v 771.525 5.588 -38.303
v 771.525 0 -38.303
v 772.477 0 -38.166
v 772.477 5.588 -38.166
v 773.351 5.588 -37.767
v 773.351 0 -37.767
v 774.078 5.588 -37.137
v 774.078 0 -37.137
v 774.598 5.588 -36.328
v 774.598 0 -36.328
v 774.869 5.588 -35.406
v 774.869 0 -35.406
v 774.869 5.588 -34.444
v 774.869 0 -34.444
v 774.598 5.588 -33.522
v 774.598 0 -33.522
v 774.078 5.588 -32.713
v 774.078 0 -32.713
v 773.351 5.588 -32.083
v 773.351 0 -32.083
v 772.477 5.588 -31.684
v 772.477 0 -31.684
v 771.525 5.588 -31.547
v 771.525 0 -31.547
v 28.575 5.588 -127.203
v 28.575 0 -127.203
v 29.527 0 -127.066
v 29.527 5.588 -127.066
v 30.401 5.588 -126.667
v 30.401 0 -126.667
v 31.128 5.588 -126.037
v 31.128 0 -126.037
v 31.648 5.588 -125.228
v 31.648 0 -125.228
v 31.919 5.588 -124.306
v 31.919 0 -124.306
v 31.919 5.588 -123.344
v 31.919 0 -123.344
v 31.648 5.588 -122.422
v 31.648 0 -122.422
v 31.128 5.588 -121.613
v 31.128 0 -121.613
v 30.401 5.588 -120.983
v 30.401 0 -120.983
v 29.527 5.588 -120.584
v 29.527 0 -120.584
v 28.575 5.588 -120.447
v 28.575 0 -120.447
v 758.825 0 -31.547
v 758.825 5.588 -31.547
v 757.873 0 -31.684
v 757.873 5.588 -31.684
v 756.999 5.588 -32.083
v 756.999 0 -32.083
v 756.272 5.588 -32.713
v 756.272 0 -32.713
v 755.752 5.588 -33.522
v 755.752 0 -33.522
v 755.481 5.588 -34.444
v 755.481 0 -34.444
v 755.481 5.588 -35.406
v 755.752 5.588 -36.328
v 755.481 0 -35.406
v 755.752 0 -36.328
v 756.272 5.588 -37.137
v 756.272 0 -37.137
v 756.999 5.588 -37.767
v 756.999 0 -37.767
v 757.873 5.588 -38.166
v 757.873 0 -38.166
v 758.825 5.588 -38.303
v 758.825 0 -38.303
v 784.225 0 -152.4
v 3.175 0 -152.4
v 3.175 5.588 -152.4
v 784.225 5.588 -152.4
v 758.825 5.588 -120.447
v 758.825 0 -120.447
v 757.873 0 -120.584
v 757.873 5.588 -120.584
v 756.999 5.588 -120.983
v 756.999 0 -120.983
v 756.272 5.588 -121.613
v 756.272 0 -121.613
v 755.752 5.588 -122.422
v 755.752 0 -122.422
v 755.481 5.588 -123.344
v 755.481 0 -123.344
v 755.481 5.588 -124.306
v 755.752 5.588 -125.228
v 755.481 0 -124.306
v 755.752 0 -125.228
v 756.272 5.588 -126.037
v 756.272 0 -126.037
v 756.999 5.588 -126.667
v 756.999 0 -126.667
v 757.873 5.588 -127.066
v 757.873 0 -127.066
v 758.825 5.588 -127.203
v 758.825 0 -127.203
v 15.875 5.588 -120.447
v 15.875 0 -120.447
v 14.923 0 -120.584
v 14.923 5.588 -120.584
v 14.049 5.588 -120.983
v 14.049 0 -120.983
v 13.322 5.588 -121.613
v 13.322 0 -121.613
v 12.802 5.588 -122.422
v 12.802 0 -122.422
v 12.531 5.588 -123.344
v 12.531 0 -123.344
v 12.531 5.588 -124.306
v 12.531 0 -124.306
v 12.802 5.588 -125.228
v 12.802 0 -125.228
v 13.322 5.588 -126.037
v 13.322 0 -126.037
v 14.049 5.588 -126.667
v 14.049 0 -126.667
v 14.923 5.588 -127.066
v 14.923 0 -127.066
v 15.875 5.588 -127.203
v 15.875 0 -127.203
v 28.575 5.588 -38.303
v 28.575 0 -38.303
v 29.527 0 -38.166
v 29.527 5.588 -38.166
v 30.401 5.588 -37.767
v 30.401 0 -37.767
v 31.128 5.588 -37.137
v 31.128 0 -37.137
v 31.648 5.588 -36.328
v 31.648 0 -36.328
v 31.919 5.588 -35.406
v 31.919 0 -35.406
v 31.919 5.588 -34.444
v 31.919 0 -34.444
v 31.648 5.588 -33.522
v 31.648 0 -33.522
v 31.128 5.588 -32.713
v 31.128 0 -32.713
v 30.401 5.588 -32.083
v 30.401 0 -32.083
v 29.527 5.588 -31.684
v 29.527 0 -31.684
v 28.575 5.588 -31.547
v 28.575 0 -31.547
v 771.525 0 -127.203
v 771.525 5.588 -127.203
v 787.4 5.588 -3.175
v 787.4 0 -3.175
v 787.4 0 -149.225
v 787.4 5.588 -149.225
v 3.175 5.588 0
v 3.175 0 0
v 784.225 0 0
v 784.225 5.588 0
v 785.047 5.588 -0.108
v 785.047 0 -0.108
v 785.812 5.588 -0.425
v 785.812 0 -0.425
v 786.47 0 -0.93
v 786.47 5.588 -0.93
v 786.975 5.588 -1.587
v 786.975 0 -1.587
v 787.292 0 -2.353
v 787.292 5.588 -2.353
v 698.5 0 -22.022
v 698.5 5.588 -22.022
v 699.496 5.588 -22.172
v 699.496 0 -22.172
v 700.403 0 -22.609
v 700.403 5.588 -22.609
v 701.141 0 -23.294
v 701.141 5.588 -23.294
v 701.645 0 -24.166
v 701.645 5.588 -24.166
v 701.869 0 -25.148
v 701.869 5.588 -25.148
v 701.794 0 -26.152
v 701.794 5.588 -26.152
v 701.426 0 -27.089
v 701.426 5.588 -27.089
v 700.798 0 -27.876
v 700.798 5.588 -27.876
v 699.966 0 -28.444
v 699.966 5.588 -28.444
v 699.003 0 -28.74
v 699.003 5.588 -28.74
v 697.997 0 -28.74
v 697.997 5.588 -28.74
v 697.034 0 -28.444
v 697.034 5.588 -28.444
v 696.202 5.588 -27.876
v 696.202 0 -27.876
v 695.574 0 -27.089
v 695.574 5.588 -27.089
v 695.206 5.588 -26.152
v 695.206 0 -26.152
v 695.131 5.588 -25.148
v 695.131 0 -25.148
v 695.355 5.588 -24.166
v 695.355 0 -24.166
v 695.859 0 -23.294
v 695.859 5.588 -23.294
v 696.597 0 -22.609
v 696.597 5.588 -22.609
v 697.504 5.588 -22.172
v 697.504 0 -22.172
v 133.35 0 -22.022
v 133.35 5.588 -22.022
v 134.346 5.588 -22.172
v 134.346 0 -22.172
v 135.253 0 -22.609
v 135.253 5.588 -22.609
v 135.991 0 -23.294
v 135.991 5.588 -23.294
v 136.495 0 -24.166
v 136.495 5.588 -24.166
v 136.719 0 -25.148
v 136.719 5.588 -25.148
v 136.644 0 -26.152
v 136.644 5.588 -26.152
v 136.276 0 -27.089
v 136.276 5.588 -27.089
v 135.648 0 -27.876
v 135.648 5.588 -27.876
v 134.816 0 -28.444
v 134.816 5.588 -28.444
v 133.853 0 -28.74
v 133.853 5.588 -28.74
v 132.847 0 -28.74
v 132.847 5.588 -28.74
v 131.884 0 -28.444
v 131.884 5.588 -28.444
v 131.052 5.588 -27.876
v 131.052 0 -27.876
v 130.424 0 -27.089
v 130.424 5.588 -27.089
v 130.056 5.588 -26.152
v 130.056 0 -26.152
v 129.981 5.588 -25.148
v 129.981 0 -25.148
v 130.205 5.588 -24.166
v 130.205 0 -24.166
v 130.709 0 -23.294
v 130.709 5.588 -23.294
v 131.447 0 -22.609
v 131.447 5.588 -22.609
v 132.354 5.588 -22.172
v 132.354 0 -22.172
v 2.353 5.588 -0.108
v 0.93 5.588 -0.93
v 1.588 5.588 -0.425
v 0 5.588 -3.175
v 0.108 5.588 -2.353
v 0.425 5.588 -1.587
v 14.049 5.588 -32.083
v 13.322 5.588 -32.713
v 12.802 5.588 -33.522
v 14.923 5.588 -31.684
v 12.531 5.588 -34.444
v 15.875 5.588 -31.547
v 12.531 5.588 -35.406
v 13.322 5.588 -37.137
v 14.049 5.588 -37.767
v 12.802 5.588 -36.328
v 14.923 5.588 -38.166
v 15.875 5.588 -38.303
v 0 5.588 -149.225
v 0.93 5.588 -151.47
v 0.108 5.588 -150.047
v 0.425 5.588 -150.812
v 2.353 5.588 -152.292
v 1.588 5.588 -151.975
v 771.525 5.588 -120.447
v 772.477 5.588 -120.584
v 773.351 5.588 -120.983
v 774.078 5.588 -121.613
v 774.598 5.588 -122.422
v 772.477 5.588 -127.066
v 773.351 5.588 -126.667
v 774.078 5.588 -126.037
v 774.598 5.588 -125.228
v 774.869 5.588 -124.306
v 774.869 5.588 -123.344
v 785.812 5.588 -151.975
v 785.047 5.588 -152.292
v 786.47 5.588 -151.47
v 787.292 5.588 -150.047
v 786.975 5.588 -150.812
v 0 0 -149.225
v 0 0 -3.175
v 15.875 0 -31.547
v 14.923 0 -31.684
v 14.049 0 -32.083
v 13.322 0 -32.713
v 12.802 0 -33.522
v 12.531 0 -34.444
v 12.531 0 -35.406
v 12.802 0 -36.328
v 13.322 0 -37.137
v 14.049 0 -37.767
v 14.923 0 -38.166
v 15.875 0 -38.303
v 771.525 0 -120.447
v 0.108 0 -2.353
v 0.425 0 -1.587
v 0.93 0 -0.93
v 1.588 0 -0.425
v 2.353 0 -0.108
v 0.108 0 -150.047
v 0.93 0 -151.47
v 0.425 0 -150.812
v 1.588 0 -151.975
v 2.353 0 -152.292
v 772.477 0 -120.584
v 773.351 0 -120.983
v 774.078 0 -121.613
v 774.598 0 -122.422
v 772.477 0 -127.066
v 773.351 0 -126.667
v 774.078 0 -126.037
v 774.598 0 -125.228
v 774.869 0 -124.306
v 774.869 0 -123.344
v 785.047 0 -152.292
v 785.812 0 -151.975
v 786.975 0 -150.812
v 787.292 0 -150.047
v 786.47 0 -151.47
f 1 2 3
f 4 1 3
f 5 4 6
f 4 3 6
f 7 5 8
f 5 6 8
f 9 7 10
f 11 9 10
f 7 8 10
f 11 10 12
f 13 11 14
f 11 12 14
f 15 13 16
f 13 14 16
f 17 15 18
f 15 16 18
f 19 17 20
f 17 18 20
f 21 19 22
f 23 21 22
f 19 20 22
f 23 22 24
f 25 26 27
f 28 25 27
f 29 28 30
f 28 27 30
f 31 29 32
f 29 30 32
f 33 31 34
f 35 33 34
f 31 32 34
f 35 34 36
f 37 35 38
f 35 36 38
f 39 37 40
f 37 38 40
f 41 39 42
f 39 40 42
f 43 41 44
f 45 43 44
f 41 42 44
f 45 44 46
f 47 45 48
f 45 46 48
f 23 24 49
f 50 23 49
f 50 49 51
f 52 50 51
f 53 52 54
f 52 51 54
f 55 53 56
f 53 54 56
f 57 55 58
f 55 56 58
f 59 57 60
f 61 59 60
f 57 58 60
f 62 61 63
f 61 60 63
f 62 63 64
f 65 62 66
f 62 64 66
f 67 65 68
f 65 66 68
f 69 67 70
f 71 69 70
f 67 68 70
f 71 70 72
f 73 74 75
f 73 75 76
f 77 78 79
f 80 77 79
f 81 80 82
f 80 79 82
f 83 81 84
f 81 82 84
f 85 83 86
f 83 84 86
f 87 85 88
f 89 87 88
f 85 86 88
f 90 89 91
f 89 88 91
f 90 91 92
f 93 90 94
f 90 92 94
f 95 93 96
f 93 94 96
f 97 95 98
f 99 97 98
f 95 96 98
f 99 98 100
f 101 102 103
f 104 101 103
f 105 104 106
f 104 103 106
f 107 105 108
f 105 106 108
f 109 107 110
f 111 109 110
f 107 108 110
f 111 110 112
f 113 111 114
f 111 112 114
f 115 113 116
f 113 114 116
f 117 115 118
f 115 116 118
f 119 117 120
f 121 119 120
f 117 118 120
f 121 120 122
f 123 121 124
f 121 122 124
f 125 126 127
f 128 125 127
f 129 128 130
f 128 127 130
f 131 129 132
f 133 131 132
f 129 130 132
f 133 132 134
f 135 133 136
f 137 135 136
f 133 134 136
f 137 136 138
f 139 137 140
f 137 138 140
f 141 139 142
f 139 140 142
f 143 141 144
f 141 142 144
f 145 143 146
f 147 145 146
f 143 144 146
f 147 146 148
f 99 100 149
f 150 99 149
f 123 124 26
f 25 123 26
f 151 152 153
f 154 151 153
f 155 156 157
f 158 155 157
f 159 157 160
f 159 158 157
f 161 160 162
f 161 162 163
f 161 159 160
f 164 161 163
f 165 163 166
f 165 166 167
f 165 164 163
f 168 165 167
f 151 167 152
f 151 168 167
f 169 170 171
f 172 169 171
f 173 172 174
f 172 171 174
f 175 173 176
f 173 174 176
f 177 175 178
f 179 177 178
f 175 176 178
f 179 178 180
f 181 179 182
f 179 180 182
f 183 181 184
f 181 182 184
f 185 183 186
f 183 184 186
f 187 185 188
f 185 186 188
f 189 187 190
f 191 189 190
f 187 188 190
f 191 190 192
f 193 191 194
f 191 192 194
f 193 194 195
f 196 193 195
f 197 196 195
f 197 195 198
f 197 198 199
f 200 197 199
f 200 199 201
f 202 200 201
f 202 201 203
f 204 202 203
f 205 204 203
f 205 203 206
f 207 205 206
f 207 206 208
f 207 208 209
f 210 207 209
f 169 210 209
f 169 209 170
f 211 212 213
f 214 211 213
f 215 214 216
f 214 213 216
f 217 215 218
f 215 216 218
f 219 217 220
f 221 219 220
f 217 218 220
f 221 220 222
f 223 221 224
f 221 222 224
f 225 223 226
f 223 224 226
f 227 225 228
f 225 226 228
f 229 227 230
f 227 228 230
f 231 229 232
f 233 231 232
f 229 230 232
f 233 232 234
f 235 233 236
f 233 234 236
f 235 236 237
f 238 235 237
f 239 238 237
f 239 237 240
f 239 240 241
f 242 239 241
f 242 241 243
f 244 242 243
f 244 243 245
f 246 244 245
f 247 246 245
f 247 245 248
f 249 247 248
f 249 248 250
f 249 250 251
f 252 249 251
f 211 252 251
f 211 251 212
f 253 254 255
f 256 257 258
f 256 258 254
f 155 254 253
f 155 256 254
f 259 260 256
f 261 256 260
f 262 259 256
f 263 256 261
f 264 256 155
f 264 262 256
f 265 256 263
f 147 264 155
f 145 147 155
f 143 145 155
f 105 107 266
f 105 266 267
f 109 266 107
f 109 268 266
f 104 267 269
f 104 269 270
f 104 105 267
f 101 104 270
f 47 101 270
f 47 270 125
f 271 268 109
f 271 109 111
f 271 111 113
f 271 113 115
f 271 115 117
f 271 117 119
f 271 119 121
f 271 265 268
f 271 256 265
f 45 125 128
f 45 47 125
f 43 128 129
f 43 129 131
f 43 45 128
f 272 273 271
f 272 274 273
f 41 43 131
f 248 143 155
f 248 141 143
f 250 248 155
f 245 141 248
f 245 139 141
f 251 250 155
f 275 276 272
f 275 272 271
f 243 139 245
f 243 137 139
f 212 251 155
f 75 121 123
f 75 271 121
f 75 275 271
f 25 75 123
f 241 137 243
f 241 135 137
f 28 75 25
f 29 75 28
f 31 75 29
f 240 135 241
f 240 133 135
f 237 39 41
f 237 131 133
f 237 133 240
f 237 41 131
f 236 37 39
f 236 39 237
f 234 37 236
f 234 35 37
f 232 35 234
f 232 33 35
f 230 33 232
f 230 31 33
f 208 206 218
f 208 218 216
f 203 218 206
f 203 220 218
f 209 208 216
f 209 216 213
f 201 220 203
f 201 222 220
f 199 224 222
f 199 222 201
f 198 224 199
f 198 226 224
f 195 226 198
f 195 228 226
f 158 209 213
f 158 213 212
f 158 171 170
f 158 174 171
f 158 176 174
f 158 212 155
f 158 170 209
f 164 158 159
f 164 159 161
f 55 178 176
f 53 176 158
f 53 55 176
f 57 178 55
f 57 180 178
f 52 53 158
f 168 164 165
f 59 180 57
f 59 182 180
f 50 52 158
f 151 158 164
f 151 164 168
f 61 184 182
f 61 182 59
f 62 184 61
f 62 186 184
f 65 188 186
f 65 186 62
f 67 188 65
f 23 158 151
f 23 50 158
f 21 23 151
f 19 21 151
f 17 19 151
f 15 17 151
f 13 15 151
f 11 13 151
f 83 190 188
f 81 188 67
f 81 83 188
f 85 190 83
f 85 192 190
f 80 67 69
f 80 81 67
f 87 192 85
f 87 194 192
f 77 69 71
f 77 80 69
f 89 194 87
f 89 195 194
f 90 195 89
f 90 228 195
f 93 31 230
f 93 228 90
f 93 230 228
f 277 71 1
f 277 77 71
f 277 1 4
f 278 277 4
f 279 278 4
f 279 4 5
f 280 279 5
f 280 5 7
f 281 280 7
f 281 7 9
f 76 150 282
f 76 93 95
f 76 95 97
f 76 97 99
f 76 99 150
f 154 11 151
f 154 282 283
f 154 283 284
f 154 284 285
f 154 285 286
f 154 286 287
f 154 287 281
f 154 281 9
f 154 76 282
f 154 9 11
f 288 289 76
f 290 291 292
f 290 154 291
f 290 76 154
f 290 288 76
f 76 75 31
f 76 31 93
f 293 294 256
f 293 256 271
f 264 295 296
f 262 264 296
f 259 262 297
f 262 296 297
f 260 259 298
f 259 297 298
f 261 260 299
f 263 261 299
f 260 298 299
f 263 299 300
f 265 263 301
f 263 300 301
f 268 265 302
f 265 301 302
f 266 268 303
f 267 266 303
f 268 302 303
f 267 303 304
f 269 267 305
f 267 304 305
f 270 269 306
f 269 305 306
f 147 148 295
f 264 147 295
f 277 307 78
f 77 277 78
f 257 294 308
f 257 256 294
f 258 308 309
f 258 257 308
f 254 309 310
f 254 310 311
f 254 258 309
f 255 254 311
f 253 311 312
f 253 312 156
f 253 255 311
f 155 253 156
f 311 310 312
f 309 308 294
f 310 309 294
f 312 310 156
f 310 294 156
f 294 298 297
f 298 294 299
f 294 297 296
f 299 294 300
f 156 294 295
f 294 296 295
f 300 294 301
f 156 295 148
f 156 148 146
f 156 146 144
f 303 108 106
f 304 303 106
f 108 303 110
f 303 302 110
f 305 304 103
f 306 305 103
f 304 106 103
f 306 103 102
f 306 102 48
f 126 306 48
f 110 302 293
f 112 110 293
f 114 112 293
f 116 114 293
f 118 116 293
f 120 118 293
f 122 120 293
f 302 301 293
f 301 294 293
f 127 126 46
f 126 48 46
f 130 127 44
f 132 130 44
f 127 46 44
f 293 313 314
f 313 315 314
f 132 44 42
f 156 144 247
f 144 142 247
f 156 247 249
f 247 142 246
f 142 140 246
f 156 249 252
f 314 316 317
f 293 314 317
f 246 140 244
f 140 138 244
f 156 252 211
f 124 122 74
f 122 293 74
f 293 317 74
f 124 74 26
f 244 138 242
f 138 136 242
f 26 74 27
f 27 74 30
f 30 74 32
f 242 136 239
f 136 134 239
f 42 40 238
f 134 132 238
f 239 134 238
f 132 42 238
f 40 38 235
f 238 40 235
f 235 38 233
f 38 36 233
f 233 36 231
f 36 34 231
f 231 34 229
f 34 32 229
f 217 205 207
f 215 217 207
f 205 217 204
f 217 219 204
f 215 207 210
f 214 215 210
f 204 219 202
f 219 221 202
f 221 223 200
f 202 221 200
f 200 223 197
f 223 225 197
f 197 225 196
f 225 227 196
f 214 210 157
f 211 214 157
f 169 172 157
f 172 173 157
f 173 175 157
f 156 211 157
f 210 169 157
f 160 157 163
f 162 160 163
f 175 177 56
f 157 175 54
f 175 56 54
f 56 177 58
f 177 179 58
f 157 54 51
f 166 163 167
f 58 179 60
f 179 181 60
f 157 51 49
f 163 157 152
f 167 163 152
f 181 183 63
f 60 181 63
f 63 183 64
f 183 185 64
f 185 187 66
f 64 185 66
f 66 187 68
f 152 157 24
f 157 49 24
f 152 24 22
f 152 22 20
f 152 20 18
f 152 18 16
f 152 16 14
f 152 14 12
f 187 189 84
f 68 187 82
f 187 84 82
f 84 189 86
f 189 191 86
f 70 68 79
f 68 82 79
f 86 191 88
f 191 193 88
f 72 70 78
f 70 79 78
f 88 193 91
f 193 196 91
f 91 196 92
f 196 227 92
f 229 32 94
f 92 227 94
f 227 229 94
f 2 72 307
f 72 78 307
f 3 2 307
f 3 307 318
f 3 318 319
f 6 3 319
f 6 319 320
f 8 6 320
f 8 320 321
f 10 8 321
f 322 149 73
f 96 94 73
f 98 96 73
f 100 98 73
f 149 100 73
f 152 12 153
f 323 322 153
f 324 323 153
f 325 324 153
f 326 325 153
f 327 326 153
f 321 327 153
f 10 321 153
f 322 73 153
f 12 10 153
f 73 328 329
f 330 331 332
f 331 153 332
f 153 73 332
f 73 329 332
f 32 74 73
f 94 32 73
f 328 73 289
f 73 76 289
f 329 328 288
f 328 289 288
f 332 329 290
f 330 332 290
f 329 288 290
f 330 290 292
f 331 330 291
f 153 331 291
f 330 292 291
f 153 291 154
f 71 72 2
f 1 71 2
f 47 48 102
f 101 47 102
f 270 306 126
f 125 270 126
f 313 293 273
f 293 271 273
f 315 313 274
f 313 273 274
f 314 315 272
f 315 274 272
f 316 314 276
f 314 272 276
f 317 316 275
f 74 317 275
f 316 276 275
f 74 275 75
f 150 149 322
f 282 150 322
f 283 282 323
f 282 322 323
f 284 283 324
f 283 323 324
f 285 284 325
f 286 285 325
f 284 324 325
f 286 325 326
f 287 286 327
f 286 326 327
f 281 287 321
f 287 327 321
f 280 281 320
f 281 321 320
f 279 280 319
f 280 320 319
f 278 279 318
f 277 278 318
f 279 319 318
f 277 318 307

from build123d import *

# Parameters (mm, degrees)
SKETCH1_W           = 787.4
SKETCH1_H           = 152.4
BOSS_EXTRUDE1_DEPTH = 5.588
FILLET1_R           = 3.175
SKETCH2_R           = 3.3782
CUT_EXTRUDE1_DEPTH  = 803.03225979


with BuildPart() as part:
    # Sketch1 → Boss-Extrude1 (new body)
    with BuildSketch(Plane(origin=(0, 0, 0), x_dir=(1, 0, 0), z_dir=(0, 1, 0))):
        with Locations((393.7, 76.2)):
            Rectangle(SKETCH1_W, SKETCH1_H)
        with BuildLine():
            Line((15.875, 38.3032), (28.575, 38.3032))
            ThreePointArc((28.575, 38.3032), (31.9532, 34.925), (28.575, 31.5468))
            Line((28.575, 31.5468), (15.875, 31.5468))
            ThreePointArc((15.875, 31.5468), (12.4968, 34.925), (15.875, 38.3032))
        make_face(mode=Mode.SUBTRACT)
        with BuildLine():
            Line((15.875, 127.2032), (28.575, 127.2032))
            ThreePointArc((28.575, 127.2032), (31.9532, 123.825), (28.575, 120.4468))
            Line((28.575, 120.4468), (15.875, 120.4468))
            ThreePointArc((15.875, 120.4468), (12.4968, 123.825), (15.875, 127.2032))
        make_face(mode=Mode.SUBTRACT)
        with BuildLine():
            Line((771.525, 120.4468), (758.825, 120.4468))
            ThreePointArc((758.825, 120.4468), (755.4468, 123.825), (758.825, 127.2032))
            Line((758.825, 127.2032), (771.525, 127.2032))
            ThreePointArc((771.525, 127.2032), (774.9032, 123.825), (771.525, 120.4468))
        make_face(mode=Mode.SUBTRACT)
        with BuildLine():
            Line((771.525, 31.5468), (758.825, 31.5468))
            ThreePointArc((758.825, 31.5468), (755.4468, 34.925), (758.825, 38.3032))
            Line((758.825, 38.3032), (771.525, 38.3032))
            ThreePointArc((771.525, 38.3032), (774.9032, 34.925), (771.525, 31.5468))
        make_face(mode=Mode.SUBTRACT)
    extrude(amount=BOSS_EXTRUDE1_DEPTH)

    # Fillet1
    fillet1_edges = [part.edges().sort_by_distance(p)[0] for p in [
        (0, 2.794, -152.4),
        (787.4, 2.794, -152.4),
        (787.4, 2.794, 0),
        (0, 2.794, 0),
    ]]
    fillet(fillet1_edges, radius=FILLET1_R)

    # Sketch2 → Cut-Extrude1 (cut, through all)
    with BuildSketch(Plane(origin=(0, 5.588, 0), x_dir=(1, 0, 0), z_dir=(0, 1, 0))):
        with Locations(Location((133.35, 25.4, 0), (0, 0, 270))):
            Circle(SKETCH2_R)
        with Locations(Location((698.5, 25.4, 0), (0, 0, 270))):
            Circle(SKETCH2_R)
    extrude(amount=-CUT_EXTRUDE1_DEPTH, mode=Mode.SUBTRACT)


solid = part.part
